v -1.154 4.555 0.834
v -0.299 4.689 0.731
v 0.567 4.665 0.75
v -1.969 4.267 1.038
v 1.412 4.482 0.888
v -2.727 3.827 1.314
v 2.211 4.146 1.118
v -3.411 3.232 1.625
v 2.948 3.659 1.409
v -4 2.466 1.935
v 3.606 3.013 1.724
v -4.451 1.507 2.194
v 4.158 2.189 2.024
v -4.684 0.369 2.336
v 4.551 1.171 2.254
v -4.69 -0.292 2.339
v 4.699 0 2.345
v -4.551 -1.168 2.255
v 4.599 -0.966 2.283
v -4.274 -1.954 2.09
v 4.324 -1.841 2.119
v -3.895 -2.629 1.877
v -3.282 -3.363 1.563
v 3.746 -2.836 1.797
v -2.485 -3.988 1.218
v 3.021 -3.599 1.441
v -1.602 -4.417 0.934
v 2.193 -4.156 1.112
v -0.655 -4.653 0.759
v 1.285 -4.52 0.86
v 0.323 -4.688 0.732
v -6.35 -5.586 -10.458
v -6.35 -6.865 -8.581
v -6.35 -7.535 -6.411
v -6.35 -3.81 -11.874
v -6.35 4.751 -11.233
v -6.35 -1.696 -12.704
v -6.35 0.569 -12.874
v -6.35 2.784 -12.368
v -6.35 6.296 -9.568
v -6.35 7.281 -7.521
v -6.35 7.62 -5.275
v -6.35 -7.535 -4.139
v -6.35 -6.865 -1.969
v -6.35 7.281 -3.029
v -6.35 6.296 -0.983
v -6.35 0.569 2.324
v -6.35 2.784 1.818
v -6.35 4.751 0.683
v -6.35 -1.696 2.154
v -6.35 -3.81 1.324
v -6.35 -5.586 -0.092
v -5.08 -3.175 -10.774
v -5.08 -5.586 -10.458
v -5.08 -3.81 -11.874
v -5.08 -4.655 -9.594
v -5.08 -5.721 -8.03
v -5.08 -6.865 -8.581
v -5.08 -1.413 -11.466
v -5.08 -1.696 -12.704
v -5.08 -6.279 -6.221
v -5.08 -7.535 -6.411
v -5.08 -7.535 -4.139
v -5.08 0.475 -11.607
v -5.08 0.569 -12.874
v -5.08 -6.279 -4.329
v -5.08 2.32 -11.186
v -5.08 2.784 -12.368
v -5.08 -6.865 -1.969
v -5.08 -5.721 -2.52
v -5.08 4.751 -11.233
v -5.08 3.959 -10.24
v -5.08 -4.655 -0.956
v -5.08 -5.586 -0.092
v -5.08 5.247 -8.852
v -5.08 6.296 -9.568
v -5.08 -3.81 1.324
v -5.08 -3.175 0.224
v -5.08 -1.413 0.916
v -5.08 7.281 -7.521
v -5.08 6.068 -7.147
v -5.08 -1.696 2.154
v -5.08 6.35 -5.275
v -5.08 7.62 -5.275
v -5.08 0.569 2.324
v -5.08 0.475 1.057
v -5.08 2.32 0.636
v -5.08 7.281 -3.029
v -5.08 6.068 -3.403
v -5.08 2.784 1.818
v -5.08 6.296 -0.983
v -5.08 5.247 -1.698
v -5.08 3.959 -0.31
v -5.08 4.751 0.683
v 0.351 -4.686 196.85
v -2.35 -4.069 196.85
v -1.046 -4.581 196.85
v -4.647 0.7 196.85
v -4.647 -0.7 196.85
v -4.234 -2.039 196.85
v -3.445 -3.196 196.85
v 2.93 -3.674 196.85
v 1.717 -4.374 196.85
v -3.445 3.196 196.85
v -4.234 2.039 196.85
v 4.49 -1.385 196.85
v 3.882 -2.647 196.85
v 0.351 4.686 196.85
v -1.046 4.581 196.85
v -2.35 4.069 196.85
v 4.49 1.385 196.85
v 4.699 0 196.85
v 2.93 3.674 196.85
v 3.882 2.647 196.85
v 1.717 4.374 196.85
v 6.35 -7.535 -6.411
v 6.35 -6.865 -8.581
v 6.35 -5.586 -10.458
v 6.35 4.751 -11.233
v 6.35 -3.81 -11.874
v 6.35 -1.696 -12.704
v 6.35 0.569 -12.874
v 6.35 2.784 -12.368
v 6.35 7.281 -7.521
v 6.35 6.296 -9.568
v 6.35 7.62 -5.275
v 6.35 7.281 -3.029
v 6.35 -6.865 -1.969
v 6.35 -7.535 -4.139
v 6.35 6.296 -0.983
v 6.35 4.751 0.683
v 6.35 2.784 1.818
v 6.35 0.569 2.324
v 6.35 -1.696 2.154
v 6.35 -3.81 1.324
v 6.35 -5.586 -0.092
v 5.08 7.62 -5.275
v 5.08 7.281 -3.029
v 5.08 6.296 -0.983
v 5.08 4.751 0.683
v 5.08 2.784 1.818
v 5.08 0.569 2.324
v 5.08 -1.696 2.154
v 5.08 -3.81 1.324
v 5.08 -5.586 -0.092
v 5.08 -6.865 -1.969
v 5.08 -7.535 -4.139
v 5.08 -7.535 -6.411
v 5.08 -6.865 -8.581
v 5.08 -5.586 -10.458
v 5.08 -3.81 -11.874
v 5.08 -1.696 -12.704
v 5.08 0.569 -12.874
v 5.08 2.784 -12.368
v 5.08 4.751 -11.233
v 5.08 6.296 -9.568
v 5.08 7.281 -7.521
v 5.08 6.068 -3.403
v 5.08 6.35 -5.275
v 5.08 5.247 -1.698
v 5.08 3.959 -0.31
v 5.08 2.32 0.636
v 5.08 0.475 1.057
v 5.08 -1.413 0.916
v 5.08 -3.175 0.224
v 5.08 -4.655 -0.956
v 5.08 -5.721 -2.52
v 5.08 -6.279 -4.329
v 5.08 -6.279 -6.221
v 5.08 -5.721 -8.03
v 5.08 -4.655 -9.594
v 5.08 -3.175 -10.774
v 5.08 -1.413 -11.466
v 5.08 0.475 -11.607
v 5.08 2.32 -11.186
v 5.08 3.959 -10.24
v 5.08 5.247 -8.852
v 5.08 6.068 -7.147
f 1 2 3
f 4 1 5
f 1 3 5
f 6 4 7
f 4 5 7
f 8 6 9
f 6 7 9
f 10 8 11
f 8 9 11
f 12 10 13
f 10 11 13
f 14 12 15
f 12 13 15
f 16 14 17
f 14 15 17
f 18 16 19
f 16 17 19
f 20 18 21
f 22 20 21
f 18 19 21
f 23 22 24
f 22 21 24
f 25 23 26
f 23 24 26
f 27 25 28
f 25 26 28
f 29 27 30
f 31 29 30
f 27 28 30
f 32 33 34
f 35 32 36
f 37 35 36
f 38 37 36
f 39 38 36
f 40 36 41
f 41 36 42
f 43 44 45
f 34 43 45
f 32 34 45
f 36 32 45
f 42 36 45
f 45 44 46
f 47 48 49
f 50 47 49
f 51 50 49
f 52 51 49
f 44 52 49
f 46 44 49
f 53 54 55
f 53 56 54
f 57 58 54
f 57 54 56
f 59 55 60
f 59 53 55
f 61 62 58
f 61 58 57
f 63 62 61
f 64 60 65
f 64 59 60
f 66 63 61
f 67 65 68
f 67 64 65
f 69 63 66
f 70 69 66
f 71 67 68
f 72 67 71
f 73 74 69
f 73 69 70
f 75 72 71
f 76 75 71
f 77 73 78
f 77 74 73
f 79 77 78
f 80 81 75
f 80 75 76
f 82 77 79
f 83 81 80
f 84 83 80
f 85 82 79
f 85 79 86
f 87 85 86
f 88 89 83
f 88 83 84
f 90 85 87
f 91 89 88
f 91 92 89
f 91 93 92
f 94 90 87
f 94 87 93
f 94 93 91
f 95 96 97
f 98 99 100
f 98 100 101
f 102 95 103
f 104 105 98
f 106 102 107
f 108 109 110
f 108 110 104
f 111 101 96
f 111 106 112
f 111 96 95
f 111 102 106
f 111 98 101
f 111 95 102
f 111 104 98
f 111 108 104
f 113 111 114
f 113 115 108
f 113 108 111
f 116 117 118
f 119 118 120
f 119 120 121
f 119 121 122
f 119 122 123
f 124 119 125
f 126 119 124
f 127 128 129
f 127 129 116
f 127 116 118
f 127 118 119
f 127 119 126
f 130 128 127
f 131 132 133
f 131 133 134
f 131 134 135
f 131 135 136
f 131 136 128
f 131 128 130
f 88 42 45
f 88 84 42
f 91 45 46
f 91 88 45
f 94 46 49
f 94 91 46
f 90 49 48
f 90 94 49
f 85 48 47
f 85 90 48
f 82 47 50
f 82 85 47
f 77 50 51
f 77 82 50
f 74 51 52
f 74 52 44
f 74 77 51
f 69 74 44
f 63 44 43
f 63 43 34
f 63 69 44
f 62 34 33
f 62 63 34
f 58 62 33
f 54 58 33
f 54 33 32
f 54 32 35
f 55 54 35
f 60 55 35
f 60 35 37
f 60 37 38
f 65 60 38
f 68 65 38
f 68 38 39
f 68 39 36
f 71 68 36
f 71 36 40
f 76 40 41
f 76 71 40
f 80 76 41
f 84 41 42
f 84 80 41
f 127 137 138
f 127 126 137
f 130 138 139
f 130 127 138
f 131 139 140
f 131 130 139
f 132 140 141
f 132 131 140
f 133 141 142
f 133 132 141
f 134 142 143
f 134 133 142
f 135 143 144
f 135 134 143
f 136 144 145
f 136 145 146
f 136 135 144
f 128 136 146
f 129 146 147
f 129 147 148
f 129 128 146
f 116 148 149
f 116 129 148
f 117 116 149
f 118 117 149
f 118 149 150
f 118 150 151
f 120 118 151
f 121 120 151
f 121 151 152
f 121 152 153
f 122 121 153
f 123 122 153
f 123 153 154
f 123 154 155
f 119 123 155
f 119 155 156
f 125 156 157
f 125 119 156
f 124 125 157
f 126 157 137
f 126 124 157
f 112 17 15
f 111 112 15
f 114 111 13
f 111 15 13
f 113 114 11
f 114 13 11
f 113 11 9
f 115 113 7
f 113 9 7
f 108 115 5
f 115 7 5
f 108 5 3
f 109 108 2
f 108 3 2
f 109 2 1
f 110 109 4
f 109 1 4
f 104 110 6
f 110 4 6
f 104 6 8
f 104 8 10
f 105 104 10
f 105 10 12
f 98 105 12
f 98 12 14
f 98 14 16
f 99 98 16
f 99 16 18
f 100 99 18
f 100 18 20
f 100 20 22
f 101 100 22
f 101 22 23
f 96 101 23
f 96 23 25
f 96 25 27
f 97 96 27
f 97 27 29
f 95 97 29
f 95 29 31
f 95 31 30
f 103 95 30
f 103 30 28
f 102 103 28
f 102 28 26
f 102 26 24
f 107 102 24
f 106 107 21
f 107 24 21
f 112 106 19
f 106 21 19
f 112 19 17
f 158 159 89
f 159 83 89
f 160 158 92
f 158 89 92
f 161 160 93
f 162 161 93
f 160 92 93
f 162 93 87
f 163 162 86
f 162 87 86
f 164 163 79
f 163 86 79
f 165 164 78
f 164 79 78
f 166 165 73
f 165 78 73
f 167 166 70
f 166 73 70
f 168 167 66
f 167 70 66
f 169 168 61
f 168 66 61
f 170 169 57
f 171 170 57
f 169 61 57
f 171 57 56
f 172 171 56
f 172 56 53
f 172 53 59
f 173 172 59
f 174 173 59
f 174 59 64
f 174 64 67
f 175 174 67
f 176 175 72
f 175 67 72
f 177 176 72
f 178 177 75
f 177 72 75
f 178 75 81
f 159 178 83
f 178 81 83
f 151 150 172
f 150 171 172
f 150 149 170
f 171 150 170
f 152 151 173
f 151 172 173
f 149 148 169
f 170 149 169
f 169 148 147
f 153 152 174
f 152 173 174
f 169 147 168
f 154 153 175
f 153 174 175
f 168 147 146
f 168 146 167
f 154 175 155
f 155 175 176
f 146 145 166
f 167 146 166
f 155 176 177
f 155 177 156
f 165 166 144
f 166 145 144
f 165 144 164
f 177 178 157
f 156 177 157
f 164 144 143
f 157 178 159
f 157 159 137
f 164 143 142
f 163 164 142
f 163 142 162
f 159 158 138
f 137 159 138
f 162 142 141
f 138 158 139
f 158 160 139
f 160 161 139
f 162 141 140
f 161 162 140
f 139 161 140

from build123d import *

# Parameters (mm, degrees)
F0_R     = 4.699
F1_DEPTH = 196.85
F2_R     = 7.62
F3_DEPTH = 6.35
F4_R     = 7.62
F4_R_2   = 6.35
F5_DEPTH = 5.08


with BuildPart() as f1:
    # F0 (on Top) → F1 (new body)
    with BuildSketch(Plane.XY):
        Circle(F0_R)
    extrude(amount=F1_DEPTH)

    # F2 (on Right) → F3 (join, symmetric)
    with BuildSketch(Plane.YZ):
        with Locations((0, -5.275038)):
            Circle(F2_R)
    extrude(amount=F3_DEPTH, both=True)

    # F4 (on Right) → F5 (cut, symmetric)
    with BuildSketch(Plane.YZ):
        with Locations((0, -5.275038)):
            Circle(F4_R)
        with Locations((0, -5.275038)):
            Circle(F4_R_2, mode=Mode.SUBTRACT)
    extrude(amount=F5_DEPTH, both=True, mode=Mode.SUBTRACT)


solid = f1.part
